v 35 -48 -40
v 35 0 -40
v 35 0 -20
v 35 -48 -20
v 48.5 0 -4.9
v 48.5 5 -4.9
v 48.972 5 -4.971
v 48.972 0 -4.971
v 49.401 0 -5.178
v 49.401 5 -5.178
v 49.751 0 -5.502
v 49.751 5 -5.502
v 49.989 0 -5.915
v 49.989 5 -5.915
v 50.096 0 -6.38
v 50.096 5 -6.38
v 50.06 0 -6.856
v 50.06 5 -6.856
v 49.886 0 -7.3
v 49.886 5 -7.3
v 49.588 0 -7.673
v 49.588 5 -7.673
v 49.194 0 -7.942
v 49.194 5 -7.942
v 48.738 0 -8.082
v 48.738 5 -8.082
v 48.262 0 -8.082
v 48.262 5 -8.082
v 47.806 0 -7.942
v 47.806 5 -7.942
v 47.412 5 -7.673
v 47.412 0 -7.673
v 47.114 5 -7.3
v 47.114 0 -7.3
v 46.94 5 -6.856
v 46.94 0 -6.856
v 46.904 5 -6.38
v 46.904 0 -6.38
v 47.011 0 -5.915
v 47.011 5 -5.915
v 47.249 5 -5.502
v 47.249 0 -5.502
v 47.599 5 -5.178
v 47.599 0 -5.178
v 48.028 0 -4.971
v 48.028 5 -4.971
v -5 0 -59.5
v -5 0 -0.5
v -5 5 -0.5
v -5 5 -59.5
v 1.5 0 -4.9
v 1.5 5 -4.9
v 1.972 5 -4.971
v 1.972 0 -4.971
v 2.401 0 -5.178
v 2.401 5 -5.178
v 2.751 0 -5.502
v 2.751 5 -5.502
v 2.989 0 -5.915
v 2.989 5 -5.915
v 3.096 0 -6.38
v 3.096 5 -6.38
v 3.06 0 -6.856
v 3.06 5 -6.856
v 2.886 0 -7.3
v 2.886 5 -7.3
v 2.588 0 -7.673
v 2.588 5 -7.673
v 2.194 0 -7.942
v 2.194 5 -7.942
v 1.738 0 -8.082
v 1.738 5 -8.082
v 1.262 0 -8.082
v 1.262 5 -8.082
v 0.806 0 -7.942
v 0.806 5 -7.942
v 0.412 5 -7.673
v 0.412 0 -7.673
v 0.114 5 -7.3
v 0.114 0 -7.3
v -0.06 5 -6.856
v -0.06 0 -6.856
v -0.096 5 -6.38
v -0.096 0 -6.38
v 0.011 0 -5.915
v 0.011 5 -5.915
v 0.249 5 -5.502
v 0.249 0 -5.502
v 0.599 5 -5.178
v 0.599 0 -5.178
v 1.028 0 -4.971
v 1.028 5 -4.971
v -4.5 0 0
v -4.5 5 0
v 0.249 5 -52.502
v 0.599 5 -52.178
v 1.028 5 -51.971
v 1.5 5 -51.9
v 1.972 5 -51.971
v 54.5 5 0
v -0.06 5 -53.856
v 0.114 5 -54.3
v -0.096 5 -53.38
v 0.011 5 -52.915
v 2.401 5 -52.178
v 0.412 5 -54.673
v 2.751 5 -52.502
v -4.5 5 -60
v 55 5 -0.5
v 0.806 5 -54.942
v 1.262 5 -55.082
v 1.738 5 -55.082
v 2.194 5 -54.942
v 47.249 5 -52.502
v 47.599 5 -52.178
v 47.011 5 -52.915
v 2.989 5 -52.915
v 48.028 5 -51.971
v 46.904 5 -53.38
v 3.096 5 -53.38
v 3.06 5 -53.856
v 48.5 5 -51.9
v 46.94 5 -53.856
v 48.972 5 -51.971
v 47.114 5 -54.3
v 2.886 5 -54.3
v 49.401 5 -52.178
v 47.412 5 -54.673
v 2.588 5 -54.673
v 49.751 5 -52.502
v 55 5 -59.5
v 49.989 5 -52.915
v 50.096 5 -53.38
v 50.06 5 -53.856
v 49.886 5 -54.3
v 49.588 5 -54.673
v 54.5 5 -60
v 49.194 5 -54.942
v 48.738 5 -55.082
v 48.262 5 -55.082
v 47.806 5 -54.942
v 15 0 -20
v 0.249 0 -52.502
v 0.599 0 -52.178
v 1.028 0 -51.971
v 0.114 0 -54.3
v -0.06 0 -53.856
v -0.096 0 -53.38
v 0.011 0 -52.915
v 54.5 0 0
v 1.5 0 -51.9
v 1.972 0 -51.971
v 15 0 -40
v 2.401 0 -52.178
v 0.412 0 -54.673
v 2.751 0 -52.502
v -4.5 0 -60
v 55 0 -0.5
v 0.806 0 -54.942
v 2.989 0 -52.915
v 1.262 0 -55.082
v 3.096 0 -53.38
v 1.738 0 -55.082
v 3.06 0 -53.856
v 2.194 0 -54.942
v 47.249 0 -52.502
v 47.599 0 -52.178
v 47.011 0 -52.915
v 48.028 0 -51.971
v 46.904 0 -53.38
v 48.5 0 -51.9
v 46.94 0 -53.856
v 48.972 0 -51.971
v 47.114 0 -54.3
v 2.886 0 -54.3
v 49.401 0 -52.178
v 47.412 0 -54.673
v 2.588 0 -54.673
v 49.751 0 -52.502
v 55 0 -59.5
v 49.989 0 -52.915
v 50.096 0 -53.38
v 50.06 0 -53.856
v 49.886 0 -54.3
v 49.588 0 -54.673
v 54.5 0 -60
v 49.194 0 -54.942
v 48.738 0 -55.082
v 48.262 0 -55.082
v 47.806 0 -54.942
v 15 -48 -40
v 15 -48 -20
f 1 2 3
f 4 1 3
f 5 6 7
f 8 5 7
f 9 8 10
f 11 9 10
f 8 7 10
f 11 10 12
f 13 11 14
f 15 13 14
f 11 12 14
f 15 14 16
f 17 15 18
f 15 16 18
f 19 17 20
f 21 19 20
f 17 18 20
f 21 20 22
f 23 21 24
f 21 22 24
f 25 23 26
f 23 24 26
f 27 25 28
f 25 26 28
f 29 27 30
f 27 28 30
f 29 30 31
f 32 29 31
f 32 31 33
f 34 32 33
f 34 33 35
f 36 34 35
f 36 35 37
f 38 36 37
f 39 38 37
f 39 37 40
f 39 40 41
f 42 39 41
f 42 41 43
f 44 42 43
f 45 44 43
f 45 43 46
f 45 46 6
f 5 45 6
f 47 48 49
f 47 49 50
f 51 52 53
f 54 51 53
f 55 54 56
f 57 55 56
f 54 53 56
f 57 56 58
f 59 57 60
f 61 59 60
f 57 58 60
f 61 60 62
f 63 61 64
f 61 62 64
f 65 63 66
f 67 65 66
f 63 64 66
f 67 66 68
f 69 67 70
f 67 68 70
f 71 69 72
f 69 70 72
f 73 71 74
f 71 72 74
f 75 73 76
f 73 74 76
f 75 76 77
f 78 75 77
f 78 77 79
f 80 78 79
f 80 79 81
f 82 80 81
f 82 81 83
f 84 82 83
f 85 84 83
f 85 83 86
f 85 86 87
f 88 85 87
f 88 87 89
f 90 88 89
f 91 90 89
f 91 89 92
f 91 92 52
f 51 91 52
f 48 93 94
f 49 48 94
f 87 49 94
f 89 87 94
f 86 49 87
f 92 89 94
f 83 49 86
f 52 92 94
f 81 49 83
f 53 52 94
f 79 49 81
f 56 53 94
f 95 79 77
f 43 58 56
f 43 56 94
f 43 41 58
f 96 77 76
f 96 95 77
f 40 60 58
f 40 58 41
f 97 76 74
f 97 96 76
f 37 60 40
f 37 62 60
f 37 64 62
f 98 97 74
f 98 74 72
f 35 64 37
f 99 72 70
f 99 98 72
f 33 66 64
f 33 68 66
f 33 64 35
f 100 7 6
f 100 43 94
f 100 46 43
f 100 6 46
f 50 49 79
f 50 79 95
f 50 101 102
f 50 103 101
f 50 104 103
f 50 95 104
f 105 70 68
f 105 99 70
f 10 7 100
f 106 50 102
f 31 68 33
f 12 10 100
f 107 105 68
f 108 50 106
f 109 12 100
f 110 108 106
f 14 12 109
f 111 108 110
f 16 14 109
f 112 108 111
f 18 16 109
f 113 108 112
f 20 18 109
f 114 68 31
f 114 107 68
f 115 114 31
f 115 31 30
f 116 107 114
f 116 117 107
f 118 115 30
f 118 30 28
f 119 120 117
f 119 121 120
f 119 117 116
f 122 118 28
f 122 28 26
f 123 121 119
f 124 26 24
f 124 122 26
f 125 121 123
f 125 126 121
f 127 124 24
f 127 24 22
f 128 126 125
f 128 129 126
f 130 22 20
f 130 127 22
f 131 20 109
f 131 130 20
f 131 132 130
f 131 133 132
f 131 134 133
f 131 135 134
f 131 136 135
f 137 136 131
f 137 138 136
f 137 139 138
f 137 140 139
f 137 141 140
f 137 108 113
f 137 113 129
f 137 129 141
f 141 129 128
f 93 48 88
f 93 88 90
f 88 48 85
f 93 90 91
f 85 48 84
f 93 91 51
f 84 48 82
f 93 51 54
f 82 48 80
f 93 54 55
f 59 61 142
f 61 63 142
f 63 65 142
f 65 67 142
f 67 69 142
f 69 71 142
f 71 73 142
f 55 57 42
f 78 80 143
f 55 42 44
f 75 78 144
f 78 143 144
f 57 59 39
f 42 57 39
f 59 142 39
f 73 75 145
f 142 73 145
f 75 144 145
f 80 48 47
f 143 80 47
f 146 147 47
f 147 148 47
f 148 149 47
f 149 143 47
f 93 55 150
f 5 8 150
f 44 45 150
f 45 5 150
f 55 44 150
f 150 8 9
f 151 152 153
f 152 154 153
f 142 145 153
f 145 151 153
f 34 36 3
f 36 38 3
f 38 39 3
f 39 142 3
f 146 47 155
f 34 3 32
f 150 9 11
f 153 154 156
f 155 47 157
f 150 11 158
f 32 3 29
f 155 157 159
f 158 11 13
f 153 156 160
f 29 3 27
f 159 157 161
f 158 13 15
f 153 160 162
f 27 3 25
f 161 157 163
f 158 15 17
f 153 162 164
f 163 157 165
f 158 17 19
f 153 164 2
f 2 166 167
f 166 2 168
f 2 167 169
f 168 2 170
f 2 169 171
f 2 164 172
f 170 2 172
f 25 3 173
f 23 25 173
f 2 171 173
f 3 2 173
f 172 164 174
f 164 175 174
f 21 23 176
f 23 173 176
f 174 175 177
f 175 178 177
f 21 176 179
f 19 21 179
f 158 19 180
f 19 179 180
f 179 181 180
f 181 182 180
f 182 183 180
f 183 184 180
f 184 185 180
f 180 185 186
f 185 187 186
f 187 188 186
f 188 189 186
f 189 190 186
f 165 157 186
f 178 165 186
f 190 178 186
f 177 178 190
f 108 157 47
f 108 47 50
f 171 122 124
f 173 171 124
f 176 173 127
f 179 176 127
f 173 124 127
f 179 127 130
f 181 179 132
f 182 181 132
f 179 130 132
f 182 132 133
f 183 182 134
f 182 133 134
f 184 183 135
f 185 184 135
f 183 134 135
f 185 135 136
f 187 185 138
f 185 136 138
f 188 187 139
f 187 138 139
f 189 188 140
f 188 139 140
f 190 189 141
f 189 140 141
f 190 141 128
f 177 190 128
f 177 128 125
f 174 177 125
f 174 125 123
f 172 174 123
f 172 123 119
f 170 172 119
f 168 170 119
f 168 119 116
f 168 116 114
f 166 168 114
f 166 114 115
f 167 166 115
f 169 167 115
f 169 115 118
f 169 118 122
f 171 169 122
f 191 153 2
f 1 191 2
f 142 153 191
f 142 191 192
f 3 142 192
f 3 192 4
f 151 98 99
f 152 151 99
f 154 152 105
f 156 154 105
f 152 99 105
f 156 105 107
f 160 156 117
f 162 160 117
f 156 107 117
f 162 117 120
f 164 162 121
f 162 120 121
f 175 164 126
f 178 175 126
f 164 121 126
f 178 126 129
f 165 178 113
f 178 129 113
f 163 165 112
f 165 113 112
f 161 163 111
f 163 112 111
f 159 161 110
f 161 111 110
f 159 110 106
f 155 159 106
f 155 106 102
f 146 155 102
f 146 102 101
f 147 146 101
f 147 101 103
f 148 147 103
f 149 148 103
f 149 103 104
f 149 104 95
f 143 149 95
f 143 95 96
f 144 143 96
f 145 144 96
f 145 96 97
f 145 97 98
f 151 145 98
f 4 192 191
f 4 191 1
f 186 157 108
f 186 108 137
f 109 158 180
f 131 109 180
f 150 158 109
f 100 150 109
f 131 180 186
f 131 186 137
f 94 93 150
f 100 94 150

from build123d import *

# Parameters (mm, degrees)
SKIZZE1_W                       = 60
SKIZZE1_H                       = 60
AUFSATZ_LINEAR_AUSTRAGEN1_DEPTH = 5
SKIZZE7_R                       = 1.6
SCHNITT_LINEAR_AUSTRAGEN1_DEPTH = 10
FASE1_SIZE                      = 0.5
SKIZZE8_W                       = 20
SKIZZE8_H                       = 20
AUFSATZ_LINEAR_AUSTRAGEN2_DEPTH = 48


with BuildPart() as part:
    # Skizze1 → Aufsatz-Linear austragen1 (new body)
    with BuildSketch(Plane(origin=(0, 0, 0), x_dir=(1, 0, 0), z_dir=(0, 1, 0))):
        with Locations((25, 30)):
            Rectangle(SKIZZE1_W, SKIZZE1_H)
    extrude(amount=AUFSATZ_LINEAR_AUSTRAGEN1_DEPTH)

    # Skizze7 → Schnitt-Linear austragen1 (cut)
    with BuildSketch(Plane(origin=(0, 5, 0), x_dir=(1, 0, 0), z_dir=(0, 1, 0))):
        with Locations(Location((1.5, 53.5, 0), (0, 0, 270))):
            Circle(SKIZZE7_R)
        with Locations(Location((48.5, 53.5, 0), (0, 0, 270))):
            Circle(SKIZZE7_R)
        with Locations(Location((48.5, 6.5, 0), (0, 0, 270))):
            Circle(SKIZZE7_R)
        with Locations(Location((1.5, 6.5, 0), (0, 0, 270))):
            Circle(SKIZZE7_R)
    extrude(amount=-SCHNITT_LINEAR_AUSTRAGEN1_DEPTH, mode=Mode.SUBTRACT)

    # Fase1
    fase1_edges = [part.edges().sort_by_distance(p)[0] for p in [
        (-5, 2.5, -60),
        (55, 2.5, -60),
        (55, 2.5, 0),
        (-5, 2.5, 0),
    ]]
    chamfer(fase1_edges, length=FASE1_SIZE)

    # Skizze8 → Aufsatz-Linear austragen2 (add)
    with BuildSketch(Plane.XZ):
        with Locations((25, -30)):
            Rectangle(SKIZZE8_W, SKIZZE8_H)
    extrude(amount=AUFSATZ_LINEAR_AUSTRAGEN2_DEPTH)


solid = part.part
